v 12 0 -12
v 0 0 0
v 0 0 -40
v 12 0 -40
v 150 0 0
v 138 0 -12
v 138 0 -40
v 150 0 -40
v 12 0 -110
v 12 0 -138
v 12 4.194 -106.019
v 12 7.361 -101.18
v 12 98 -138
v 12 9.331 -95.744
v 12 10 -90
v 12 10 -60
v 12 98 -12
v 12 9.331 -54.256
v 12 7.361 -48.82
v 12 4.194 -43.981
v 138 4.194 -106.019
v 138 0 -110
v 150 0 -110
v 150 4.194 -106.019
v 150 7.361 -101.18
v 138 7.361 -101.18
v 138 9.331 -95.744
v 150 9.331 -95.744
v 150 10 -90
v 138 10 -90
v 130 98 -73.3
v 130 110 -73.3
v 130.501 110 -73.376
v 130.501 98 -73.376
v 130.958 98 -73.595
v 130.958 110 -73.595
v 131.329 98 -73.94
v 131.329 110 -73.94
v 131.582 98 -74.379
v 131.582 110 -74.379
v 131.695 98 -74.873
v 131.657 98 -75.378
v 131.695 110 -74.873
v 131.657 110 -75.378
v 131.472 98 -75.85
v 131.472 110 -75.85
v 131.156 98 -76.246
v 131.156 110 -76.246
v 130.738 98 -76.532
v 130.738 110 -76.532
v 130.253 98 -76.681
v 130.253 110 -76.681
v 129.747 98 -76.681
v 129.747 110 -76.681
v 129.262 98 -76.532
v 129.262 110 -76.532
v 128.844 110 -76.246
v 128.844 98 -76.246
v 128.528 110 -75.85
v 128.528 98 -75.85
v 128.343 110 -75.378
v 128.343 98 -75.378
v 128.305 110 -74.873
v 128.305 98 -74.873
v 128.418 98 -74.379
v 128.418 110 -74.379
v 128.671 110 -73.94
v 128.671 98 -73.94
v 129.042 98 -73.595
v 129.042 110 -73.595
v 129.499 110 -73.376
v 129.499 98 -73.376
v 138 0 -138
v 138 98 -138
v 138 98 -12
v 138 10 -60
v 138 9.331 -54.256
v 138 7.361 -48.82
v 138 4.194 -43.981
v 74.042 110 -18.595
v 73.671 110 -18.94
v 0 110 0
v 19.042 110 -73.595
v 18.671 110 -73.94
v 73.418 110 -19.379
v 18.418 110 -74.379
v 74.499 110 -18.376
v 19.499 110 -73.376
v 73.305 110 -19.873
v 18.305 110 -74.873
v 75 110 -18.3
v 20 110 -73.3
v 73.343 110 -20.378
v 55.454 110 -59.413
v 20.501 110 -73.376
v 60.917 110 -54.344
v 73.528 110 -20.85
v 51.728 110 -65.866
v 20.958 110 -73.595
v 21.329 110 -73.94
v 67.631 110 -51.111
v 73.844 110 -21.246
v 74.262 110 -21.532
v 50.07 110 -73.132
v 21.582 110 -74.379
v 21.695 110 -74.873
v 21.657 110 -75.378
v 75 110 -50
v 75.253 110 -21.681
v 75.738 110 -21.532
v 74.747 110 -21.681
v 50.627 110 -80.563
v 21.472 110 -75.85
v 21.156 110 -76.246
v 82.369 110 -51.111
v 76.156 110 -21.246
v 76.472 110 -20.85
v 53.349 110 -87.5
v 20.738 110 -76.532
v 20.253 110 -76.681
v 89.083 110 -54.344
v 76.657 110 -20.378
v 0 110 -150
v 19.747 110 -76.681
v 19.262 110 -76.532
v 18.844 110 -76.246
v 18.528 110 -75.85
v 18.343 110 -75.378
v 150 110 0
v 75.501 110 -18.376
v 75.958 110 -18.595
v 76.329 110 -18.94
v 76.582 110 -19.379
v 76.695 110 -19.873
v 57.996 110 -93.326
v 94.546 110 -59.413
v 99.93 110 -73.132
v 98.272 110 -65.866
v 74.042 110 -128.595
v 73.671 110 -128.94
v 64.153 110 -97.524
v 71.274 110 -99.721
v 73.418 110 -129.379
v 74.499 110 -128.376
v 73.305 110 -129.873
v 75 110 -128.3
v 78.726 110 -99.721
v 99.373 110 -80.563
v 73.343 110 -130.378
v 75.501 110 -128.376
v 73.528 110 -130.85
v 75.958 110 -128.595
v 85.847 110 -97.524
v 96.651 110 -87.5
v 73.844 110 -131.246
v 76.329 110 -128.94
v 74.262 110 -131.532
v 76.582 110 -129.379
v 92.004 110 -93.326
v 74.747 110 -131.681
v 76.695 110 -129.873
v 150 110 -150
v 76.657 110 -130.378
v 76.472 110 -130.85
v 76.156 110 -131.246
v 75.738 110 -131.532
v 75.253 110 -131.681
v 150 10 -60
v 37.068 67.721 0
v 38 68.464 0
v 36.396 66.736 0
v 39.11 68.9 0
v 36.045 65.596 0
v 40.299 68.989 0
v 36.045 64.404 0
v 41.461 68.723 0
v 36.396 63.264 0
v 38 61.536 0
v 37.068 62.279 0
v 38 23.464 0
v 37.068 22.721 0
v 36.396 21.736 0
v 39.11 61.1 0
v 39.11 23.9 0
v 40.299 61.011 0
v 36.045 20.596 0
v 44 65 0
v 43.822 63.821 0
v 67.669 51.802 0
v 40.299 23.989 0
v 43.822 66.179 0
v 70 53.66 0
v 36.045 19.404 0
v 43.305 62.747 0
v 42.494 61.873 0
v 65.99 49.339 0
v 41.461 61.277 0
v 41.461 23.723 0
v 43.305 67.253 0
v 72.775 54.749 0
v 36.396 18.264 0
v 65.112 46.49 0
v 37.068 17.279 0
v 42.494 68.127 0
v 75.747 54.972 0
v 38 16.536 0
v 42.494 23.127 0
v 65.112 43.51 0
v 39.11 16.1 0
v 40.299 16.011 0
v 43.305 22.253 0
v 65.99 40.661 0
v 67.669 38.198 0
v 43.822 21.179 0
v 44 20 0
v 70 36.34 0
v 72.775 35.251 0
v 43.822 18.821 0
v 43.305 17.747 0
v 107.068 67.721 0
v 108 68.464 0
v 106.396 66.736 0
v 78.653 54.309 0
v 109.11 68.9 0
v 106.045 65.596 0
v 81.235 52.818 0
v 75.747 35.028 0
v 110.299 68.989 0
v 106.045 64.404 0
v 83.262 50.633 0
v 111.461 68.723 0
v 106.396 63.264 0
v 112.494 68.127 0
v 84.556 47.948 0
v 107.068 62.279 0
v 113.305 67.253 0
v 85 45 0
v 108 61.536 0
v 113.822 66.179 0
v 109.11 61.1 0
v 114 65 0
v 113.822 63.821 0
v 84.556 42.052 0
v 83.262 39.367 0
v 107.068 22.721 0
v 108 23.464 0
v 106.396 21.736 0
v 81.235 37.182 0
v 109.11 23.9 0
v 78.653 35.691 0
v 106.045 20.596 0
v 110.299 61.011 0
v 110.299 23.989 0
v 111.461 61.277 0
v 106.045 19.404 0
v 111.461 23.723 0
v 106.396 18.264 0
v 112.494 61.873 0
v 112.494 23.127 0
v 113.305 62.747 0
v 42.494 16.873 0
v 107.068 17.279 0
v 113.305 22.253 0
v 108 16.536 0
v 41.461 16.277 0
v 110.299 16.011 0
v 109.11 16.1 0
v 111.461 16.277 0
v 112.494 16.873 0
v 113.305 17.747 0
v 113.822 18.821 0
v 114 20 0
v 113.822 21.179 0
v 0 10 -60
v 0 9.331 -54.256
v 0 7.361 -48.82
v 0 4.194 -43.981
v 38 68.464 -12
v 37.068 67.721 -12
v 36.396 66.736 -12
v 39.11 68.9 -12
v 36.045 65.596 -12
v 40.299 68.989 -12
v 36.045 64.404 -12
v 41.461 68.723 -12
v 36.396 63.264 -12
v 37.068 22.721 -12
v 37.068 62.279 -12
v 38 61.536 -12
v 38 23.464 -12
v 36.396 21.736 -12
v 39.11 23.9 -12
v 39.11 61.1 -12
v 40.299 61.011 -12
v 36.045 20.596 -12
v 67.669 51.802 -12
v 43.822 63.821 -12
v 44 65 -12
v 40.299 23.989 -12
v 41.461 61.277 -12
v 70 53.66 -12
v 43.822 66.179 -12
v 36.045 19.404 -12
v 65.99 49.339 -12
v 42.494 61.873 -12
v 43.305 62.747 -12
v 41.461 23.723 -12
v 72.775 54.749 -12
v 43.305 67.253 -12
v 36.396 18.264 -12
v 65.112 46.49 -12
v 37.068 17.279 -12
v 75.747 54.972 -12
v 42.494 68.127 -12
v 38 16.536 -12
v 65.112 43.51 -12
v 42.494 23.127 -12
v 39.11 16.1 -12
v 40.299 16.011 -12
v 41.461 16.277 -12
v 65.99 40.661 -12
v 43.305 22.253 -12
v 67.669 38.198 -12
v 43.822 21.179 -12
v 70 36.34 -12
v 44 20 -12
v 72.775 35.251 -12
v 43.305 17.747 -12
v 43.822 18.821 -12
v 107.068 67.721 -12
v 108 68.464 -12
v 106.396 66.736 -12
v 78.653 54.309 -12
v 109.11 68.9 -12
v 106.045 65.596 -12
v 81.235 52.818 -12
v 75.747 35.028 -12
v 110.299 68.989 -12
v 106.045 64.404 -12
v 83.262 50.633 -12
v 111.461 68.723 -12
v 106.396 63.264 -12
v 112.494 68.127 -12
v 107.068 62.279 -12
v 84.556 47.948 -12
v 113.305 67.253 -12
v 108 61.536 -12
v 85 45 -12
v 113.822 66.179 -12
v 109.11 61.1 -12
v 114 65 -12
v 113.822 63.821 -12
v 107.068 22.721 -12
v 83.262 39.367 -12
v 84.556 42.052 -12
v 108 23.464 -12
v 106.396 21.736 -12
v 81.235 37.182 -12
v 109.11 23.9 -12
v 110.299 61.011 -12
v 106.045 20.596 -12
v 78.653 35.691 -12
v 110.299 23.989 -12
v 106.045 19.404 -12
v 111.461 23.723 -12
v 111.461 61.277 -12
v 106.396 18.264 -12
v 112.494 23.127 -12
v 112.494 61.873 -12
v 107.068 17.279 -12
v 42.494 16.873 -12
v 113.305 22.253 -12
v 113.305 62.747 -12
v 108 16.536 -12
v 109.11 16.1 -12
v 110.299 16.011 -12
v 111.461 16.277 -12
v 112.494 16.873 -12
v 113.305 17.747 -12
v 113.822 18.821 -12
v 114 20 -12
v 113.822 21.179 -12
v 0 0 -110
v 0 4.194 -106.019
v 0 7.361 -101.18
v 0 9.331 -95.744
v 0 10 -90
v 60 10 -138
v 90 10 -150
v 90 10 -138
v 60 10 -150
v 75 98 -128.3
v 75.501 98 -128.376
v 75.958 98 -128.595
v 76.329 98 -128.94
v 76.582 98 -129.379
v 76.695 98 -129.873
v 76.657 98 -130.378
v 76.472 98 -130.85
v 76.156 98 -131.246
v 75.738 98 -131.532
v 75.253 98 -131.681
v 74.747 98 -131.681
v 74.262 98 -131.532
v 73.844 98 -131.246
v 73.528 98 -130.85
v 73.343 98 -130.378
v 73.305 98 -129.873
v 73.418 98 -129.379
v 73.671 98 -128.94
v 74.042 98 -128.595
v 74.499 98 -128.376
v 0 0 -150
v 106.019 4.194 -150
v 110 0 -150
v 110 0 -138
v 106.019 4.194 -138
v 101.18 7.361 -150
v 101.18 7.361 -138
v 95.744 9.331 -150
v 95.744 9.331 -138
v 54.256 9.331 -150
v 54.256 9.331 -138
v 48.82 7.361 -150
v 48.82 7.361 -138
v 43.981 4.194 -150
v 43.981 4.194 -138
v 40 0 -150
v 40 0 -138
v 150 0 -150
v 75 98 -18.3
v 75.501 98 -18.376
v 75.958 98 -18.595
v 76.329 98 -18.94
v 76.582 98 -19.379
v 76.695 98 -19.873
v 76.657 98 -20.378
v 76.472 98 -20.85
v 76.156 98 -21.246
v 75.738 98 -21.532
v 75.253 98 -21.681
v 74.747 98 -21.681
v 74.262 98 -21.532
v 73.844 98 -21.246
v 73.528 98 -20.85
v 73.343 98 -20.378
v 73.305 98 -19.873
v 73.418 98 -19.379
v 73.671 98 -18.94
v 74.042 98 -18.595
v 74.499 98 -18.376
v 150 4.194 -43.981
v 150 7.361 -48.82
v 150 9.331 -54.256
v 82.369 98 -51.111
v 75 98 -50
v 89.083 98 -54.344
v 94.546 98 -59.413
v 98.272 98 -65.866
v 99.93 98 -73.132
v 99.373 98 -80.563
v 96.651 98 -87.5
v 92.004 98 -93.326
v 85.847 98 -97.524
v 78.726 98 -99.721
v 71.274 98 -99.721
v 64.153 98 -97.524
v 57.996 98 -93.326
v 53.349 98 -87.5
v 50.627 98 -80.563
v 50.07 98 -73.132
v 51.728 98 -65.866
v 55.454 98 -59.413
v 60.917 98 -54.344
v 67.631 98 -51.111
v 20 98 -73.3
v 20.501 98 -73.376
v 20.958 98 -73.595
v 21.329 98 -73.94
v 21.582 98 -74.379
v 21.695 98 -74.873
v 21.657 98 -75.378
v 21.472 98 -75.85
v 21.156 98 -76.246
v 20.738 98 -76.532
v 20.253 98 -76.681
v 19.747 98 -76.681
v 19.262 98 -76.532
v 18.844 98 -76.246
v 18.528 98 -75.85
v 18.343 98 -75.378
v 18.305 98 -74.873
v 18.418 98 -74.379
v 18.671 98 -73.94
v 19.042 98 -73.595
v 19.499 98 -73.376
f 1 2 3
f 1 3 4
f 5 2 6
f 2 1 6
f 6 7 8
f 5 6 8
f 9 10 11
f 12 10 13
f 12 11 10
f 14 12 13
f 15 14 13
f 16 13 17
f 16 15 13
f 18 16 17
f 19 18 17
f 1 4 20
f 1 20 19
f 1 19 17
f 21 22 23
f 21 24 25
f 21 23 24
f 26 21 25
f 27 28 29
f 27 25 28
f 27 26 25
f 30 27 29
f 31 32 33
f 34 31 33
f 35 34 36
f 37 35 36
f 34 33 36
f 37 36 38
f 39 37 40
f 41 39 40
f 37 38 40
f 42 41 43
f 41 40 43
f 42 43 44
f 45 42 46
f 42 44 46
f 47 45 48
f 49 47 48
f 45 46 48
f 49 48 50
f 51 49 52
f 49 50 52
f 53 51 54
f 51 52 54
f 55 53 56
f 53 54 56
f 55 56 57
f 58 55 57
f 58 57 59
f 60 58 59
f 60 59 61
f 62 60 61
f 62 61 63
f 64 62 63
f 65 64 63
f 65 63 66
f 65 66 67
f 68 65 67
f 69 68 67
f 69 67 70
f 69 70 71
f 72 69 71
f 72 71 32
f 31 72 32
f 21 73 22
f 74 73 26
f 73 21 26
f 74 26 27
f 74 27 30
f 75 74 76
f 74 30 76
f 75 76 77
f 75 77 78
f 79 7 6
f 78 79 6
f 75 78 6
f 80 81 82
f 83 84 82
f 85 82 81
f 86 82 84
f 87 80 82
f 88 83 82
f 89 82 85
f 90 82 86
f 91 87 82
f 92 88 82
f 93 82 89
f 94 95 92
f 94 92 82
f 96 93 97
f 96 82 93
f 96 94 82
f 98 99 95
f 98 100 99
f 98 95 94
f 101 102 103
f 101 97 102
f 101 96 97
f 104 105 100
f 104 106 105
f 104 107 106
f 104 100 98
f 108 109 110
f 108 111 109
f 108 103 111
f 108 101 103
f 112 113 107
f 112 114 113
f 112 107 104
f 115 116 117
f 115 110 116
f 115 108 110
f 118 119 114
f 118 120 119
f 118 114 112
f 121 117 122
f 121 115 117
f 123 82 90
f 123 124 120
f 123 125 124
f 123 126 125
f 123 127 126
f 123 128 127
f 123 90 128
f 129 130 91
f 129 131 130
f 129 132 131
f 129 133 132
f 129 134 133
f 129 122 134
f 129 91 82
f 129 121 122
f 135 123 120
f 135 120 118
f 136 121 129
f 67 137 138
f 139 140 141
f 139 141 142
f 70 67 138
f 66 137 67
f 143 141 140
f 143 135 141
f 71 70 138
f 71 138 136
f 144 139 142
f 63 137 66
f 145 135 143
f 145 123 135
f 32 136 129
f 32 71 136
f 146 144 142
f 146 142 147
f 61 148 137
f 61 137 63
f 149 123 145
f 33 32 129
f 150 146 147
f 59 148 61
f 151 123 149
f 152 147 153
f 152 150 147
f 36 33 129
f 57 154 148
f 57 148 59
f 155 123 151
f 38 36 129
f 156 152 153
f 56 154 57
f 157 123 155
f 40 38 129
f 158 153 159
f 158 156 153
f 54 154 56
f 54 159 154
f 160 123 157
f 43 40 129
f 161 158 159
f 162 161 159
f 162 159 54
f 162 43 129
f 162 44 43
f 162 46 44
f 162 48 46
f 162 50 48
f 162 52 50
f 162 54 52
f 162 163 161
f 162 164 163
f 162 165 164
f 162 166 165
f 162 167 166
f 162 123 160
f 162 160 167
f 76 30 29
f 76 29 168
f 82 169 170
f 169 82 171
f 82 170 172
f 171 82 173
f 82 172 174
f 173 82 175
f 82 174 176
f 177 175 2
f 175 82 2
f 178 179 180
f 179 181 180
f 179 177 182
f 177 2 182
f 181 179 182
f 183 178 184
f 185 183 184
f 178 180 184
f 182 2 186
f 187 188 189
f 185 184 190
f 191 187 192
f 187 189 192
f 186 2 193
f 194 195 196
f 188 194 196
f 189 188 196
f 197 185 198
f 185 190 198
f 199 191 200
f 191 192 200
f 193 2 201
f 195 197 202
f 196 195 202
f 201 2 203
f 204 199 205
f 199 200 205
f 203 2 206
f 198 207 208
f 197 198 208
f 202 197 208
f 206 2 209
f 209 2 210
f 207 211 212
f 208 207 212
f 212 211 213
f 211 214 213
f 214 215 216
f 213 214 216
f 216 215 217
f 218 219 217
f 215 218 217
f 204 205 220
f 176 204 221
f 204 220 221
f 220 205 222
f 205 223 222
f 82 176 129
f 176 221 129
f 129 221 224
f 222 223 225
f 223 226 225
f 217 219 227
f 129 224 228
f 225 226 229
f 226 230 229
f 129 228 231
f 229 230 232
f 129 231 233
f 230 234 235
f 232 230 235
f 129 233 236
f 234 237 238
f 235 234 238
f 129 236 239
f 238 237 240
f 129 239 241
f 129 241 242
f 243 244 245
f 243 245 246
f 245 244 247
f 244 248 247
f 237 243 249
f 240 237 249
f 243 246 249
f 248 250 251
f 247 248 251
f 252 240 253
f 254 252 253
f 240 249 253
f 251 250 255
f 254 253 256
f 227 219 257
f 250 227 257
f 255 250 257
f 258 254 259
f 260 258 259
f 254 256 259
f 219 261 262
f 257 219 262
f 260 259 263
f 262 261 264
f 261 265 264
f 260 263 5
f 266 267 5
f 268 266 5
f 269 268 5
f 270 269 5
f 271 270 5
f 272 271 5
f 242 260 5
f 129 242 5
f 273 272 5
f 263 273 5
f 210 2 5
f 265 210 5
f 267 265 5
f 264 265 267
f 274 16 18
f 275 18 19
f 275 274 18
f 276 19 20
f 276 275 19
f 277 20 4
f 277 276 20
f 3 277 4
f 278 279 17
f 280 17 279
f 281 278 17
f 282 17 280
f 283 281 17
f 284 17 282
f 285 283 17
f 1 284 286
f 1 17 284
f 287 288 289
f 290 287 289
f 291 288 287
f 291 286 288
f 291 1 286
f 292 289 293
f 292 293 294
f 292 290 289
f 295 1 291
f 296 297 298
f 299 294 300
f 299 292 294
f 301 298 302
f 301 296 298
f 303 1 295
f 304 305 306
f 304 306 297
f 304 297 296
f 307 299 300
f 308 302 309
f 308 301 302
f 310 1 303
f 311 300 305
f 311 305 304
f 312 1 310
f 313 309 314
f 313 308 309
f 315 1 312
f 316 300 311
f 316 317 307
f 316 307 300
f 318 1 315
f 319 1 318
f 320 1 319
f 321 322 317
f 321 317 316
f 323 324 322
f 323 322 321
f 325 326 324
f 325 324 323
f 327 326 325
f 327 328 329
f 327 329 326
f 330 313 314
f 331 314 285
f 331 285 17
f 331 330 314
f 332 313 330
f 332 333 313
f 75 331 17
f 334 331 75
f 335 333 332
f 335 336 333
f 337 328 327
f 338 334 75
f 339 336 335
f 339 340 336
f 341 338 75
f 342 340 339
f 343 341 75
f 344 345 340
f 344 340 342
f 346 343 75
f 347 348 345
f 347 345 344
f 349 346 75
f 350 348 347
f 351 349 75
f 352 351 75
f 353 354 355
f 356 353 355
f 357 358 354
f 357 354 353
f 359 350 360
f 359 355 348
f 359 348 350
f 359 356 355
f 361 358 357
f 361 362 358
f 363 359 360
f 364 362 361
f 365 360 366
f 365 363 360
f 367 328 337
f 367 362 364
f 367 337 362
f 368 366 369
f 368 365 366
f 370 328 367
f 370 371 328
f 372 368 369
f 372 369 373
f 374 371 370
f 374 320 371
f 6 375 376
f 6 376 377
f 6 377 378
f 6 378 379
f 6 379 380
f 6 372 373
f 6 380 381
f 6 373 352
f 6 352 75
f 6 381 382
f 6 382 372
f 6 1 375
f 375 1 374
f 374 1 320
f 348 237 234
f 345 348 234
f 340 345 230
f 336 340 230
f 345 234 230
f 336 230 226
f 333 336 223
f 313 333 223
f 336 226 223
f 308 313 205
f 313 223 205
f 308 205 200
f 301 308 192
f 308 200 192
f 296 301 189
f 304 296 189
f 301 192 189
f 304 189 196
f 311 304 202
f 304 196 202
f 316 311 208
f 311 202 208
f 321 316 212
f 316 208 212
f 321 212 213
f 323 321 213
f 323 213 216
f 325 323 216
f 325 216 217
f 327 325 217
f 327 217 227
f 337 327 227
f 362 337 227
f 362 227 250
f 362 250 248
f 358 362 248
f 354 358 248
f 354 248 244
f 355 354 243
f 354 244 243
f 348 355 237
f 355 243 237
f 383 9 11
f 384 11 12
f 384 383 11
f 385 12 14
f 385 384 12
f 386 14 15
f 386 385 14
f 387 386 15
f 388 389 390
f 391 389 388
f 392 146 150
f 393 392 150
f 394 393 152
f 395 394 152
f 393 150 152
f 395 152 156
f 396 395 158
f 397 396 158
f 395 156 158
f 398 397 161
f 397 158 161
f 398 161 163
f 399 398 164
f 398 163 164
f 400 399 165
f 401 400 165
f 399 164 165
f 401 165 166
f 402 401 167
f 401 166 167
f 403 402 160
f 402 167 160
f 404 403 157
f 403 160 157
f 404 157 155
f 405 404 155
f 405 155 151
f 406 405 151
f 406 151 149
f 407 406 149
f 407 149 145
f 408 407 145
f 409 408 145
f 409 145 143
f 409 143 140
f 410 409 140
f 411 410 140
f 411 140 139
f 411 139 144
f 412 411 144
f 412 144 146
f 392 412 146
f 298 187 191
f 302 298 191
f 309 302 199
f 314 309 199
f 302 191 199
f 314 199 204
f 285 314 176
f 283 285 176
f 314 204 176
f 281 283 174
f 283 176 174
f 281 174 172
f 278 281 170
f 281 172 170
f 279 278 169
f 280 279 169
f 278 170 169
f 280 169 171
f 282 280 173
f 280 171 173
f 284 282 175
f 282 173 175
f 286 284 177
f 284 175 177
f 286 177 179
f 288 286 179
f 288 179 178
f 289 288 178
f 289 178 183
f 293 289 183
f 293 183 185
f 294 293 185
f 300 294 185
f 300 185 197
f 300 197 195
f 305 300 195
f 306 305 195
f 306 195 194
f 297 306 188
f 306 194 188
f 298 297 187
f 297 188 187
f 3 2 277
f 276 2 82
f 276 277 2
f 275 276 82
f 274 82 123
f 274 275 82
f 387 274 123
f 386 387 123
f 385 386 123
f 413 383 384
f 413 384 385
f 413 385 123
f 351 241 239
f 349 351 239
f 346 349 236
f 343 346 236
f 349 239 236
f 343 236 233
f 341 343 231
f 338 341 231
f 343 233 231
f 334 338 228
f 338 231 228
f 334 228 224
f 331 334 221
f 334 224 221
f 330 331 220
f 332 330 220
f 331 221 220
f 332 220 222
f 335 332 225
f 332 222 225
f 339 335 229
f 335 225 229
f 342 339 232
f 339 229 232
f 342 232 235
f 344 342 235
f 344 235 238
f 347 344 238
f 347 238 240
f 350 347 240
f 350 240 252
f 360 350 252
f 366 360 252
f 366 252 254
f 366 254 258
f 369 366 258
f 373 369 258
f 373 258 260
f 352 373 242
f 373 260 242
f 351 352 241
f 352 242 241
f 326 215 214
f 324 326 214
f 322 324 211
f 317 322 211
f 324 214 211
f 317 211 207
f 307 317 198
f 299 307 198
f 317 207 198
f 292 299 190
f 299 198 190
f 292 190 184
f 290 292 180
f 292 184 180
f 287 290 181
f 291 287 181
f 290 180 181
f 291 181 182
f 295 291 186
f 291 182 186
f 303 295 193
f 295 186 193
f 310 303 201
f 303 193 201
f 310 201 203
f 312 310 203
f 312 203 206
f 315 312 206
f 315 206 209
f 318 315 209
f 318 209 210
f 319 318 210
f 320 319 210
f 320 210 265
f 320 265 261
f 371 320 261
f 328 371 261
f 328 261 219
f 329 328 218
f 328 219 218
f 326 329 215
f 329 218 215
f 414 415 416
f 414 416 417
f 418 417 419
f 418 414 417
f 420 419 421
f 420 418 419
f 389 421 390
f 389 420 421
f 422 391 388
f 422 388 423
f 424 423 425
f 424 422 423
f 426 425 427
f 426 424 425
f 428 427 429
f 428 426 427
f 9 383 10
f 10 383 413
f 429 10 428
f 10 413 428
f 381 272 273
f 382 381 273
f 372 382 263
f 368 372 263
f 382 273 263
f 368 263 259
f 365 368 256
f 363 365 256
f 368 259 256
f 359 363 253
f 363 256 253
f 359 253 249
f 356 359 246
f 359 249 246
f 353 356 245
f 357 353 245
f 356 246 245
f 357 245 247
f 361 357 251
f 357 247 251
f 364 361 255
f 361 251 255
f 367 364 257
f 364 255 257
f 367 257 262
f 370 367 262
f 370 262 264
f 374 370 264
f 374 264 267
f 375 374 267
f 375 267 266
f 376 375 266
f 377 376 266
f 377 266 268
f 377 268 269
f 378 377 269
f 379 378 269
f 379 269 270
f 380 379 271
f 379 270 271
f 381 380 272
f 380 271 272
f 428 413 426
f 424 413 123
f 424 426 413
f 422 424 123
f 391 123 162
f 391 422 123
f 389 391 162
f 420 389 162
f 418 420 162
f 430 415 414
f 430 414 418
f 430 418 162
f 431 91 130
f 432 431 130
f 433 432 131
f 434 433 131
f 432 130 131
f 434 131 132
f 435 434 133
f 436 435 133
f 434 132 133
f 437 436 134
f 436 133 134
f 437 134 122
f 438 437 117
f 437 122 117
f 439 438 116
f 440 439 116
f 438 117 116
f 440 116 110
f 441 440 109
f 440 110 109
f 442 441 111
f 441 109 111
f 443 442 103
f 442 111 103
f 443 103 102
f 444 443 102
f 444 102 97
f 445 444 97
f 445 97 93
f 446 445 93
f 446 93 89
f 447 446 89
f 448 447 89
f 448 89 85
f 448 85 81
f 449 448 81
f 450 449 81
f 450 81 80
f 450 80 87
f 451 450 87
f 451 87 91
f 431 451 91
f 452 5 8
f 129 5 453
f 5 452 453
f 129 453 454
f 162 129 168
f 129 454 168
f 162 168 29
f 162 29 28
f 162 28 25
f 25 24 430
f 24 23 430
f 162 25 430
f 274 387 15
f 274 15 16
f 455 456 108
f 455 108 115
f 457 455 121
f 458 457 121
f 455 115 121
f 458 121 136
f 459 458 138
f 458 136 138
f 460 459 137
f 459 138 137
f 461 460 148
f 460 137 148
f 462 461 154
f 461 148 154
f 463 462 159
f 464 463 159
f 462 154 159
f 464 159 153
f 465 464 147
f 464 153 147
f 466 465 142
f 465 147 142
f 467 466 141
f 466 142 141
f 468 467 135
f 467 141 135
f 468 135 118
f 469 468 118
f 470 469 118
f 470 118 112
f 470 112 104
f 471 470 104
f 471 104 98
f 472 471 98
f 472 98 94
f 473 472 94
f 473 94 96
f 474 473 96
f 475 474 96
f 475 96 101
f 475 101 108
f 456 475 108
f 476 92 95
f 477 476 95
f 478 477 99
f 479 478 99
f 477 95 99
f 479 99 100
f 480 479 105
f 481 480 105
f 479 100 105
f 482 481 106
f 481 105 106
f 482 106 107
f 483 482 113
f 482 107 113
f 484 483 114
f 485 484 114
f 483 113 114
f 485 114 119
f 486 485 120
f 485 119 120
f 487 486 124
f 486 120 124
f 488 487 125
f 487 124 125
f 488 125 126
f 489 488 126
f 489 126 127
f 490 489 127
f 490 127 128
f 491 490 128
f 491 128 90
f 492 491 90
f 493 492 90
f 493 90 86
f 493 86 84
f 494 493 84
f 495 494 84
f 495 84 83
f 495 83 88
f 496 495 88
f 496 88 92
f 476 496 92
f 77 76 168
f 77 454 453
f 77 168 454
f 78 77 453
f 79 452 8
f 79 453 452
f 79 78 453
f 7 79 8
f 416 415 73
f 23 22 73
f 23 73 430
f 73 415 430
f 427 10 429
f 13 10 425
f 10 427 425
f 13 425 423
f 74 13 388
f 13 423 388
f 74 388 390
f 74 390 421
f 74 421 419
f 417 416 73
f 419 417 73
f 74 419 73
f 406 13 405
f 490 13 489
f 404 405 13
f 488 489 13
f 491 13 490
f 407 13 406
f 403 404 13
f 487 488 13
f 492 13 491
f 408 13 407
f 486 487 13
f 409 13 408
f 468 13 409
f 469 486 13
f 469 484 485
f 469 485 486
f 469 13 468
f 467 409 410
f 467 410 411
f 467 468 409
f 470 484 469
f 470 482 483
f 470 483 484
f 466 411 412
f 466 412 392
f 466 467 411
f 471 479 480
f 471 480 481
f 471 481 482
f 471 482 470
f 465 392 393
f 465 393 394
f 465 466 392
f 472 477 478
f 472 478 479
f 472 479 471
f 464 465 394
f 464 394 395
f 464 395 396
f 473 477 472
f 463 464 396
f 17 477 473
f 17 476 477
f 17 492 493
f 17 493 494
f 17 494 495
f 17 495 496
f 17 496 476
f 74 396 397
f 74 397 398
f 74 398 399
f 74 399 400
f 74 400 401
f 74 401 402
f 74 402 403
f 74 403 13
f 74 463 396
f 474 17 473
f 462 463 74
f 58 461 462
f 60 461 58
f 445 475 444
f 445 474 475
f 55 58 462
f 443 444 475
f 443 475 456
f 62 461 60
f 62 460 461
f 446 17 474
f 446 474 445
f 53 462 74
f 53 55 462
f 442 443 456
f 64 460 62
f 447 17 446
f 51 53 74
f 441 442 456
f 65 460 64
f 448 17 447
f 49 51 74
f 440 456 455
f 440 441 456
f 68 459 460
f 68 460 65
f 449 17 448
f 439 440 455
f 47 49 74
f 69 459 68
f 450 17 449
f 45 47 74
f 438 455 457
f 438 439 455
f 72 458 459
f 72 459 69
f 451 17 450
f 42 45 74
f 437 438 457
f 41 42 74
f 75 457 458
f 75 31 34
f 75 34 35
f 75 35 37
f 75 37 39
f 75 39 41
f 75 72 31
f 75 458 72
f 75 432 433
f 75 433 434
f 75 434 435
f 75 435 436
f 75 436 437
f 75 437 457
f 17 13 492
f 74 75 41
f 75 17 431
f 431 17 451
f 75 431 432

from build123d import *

# Parameters (mm, degrees)
SKETCH1_W           = 150
SKETCH1_H           = 150
BOSS_EXTRUDE1_DEPTH = 110
SKETCH3_W           = 126
SKETCH3_H           = 126
CUT_EXTRUDE1_DEPTH  = 98
SKETCH4_R           = 1.7
SKETCH4_R_2         = 25
CUT_EXTRUDE2_DEPTH  = 239.956062907
CUT_EXTRUDE3_DEPTH  = 239.956062907
CUT_EXTRUDE4_START  = 150
CUT_EXTRUDE4_DEPTH  = 12
SKETCH5_R           = 4
SKETCH5_R_2         = 10
CUT_EXTRUDE5_DEPTH  = 12


with BuildPart() as part:
    # Sketch1 → Boss-Extrude1 (new body)
    with BuildSketch(Plane(origin=(0, 0, 0), x_dir=(1, 0, 0), z_dir=(0, 1, 0))):
        with Locations((75, 75)):
            Rectangle(SKETCH1_W, SKETCH1_H)
    extrude(amount=BOSS_EXTRUDE1_DEPTH)

    # Sketch3 → Cut-Extrude1 (cut)
    with BuildSketch(Plane.XZ):
        with Locations((75, -75)):
            Rectangle(SKETCH3_W, SKETCH3_H)
    extrude(amount=-CUT_EXTRUDE1_DEPTH, mode=Mode.SUBTRACT)

    # Sketch4 → Cut-Extrude2 (cut, through all)
    with BuildSketch(Plane(origin=(0, 110, 0), x_dir=(1, 0, 0), z_dir=(0, 1, 0))):
        with Locations(Location((75, 130, 0), (0, 0, 270))):
            Circle(SKETCH4_R)
        with Locations(Location((130, 75, 0), (0, 0, 270))):
            Circle(SKETCH4_R)
        with Locations(Location((75, 20, 0), (0, 0, 270))):
            Circle(SKETCH4_R)
        with Locations(Location((20, 75, 0), (0, 0, 270))):
            Circle(SKETCH4_R)
        with Locations(Location((75, 75, 0), (0, 0, 270))):
            Circle(SKETCH4_R_2)
    extrude(amount=-CUT_EXTRUDE2_DEPTH, mode=Mode.SUBTRACT)

    # Sketch6 → Cut-Extrude3 (cut, through all)
    with BuildSketch(Plane.ZY):
        with BuildLine():
            Line((-90, 10), (-60, 10))
            ThreePointArc((-60, 10), (-48.819660113, 7.360679775), (-40, 0))
            Line((-40, 0), (-110, 0))
            ThreePointArc((-110, 0), (-101.180339887, 7.360679775), (-90, 10))
        make_face()
    extrude(amount=-CUT_EXTRUDE3_DEPTH, mode=Mode.SUBTRACT)

    # Sketch7 → Cut-Extrude4 (cut)
    with BuildSketch(Plane(origin=(0, 0, 0), x_dir=(-1, 0, 0), z_dir=(0, 0, -1)).offset(CUT_EXTRUDE4_START)):
        with BuildLine():
            Line((-90, 10), (-60, 10))
            ThreePointArc((-60, 10), (-48.819660113, 7.360679775), (-40, 0))
            Line((-40, 0), (-110, 0))
            ThreePointArc((-110, 0), (-101.180339887, 7.360679775), (-90, 10))
        make_face()
    extrude(amount=-CUT_EXTRUDE4_DEPTH, mode=Mode.SUBTRACT)

    # Sketch5 → Cut-Extrude5 (cut)
    with BuildSketch(Plane.XY):
        with Locations((40, 65)):
            Circle(SKETCH5_R)
        with Locations((75, 45)):
            Circle(SKETCH5_R_2)
        with Locations((110, 65)):
            Circle(SKETCH5_R)
        with Locations((40, 20)):
            Circle(SKETCH5_R)
        with Locations((110, 20)):
            Circle(SKETCH5_R)
    extrude(amount=-CUT_EXTRUDE5_DEPTH, mode=Mode.SUBTRACT)


solid = part.part
